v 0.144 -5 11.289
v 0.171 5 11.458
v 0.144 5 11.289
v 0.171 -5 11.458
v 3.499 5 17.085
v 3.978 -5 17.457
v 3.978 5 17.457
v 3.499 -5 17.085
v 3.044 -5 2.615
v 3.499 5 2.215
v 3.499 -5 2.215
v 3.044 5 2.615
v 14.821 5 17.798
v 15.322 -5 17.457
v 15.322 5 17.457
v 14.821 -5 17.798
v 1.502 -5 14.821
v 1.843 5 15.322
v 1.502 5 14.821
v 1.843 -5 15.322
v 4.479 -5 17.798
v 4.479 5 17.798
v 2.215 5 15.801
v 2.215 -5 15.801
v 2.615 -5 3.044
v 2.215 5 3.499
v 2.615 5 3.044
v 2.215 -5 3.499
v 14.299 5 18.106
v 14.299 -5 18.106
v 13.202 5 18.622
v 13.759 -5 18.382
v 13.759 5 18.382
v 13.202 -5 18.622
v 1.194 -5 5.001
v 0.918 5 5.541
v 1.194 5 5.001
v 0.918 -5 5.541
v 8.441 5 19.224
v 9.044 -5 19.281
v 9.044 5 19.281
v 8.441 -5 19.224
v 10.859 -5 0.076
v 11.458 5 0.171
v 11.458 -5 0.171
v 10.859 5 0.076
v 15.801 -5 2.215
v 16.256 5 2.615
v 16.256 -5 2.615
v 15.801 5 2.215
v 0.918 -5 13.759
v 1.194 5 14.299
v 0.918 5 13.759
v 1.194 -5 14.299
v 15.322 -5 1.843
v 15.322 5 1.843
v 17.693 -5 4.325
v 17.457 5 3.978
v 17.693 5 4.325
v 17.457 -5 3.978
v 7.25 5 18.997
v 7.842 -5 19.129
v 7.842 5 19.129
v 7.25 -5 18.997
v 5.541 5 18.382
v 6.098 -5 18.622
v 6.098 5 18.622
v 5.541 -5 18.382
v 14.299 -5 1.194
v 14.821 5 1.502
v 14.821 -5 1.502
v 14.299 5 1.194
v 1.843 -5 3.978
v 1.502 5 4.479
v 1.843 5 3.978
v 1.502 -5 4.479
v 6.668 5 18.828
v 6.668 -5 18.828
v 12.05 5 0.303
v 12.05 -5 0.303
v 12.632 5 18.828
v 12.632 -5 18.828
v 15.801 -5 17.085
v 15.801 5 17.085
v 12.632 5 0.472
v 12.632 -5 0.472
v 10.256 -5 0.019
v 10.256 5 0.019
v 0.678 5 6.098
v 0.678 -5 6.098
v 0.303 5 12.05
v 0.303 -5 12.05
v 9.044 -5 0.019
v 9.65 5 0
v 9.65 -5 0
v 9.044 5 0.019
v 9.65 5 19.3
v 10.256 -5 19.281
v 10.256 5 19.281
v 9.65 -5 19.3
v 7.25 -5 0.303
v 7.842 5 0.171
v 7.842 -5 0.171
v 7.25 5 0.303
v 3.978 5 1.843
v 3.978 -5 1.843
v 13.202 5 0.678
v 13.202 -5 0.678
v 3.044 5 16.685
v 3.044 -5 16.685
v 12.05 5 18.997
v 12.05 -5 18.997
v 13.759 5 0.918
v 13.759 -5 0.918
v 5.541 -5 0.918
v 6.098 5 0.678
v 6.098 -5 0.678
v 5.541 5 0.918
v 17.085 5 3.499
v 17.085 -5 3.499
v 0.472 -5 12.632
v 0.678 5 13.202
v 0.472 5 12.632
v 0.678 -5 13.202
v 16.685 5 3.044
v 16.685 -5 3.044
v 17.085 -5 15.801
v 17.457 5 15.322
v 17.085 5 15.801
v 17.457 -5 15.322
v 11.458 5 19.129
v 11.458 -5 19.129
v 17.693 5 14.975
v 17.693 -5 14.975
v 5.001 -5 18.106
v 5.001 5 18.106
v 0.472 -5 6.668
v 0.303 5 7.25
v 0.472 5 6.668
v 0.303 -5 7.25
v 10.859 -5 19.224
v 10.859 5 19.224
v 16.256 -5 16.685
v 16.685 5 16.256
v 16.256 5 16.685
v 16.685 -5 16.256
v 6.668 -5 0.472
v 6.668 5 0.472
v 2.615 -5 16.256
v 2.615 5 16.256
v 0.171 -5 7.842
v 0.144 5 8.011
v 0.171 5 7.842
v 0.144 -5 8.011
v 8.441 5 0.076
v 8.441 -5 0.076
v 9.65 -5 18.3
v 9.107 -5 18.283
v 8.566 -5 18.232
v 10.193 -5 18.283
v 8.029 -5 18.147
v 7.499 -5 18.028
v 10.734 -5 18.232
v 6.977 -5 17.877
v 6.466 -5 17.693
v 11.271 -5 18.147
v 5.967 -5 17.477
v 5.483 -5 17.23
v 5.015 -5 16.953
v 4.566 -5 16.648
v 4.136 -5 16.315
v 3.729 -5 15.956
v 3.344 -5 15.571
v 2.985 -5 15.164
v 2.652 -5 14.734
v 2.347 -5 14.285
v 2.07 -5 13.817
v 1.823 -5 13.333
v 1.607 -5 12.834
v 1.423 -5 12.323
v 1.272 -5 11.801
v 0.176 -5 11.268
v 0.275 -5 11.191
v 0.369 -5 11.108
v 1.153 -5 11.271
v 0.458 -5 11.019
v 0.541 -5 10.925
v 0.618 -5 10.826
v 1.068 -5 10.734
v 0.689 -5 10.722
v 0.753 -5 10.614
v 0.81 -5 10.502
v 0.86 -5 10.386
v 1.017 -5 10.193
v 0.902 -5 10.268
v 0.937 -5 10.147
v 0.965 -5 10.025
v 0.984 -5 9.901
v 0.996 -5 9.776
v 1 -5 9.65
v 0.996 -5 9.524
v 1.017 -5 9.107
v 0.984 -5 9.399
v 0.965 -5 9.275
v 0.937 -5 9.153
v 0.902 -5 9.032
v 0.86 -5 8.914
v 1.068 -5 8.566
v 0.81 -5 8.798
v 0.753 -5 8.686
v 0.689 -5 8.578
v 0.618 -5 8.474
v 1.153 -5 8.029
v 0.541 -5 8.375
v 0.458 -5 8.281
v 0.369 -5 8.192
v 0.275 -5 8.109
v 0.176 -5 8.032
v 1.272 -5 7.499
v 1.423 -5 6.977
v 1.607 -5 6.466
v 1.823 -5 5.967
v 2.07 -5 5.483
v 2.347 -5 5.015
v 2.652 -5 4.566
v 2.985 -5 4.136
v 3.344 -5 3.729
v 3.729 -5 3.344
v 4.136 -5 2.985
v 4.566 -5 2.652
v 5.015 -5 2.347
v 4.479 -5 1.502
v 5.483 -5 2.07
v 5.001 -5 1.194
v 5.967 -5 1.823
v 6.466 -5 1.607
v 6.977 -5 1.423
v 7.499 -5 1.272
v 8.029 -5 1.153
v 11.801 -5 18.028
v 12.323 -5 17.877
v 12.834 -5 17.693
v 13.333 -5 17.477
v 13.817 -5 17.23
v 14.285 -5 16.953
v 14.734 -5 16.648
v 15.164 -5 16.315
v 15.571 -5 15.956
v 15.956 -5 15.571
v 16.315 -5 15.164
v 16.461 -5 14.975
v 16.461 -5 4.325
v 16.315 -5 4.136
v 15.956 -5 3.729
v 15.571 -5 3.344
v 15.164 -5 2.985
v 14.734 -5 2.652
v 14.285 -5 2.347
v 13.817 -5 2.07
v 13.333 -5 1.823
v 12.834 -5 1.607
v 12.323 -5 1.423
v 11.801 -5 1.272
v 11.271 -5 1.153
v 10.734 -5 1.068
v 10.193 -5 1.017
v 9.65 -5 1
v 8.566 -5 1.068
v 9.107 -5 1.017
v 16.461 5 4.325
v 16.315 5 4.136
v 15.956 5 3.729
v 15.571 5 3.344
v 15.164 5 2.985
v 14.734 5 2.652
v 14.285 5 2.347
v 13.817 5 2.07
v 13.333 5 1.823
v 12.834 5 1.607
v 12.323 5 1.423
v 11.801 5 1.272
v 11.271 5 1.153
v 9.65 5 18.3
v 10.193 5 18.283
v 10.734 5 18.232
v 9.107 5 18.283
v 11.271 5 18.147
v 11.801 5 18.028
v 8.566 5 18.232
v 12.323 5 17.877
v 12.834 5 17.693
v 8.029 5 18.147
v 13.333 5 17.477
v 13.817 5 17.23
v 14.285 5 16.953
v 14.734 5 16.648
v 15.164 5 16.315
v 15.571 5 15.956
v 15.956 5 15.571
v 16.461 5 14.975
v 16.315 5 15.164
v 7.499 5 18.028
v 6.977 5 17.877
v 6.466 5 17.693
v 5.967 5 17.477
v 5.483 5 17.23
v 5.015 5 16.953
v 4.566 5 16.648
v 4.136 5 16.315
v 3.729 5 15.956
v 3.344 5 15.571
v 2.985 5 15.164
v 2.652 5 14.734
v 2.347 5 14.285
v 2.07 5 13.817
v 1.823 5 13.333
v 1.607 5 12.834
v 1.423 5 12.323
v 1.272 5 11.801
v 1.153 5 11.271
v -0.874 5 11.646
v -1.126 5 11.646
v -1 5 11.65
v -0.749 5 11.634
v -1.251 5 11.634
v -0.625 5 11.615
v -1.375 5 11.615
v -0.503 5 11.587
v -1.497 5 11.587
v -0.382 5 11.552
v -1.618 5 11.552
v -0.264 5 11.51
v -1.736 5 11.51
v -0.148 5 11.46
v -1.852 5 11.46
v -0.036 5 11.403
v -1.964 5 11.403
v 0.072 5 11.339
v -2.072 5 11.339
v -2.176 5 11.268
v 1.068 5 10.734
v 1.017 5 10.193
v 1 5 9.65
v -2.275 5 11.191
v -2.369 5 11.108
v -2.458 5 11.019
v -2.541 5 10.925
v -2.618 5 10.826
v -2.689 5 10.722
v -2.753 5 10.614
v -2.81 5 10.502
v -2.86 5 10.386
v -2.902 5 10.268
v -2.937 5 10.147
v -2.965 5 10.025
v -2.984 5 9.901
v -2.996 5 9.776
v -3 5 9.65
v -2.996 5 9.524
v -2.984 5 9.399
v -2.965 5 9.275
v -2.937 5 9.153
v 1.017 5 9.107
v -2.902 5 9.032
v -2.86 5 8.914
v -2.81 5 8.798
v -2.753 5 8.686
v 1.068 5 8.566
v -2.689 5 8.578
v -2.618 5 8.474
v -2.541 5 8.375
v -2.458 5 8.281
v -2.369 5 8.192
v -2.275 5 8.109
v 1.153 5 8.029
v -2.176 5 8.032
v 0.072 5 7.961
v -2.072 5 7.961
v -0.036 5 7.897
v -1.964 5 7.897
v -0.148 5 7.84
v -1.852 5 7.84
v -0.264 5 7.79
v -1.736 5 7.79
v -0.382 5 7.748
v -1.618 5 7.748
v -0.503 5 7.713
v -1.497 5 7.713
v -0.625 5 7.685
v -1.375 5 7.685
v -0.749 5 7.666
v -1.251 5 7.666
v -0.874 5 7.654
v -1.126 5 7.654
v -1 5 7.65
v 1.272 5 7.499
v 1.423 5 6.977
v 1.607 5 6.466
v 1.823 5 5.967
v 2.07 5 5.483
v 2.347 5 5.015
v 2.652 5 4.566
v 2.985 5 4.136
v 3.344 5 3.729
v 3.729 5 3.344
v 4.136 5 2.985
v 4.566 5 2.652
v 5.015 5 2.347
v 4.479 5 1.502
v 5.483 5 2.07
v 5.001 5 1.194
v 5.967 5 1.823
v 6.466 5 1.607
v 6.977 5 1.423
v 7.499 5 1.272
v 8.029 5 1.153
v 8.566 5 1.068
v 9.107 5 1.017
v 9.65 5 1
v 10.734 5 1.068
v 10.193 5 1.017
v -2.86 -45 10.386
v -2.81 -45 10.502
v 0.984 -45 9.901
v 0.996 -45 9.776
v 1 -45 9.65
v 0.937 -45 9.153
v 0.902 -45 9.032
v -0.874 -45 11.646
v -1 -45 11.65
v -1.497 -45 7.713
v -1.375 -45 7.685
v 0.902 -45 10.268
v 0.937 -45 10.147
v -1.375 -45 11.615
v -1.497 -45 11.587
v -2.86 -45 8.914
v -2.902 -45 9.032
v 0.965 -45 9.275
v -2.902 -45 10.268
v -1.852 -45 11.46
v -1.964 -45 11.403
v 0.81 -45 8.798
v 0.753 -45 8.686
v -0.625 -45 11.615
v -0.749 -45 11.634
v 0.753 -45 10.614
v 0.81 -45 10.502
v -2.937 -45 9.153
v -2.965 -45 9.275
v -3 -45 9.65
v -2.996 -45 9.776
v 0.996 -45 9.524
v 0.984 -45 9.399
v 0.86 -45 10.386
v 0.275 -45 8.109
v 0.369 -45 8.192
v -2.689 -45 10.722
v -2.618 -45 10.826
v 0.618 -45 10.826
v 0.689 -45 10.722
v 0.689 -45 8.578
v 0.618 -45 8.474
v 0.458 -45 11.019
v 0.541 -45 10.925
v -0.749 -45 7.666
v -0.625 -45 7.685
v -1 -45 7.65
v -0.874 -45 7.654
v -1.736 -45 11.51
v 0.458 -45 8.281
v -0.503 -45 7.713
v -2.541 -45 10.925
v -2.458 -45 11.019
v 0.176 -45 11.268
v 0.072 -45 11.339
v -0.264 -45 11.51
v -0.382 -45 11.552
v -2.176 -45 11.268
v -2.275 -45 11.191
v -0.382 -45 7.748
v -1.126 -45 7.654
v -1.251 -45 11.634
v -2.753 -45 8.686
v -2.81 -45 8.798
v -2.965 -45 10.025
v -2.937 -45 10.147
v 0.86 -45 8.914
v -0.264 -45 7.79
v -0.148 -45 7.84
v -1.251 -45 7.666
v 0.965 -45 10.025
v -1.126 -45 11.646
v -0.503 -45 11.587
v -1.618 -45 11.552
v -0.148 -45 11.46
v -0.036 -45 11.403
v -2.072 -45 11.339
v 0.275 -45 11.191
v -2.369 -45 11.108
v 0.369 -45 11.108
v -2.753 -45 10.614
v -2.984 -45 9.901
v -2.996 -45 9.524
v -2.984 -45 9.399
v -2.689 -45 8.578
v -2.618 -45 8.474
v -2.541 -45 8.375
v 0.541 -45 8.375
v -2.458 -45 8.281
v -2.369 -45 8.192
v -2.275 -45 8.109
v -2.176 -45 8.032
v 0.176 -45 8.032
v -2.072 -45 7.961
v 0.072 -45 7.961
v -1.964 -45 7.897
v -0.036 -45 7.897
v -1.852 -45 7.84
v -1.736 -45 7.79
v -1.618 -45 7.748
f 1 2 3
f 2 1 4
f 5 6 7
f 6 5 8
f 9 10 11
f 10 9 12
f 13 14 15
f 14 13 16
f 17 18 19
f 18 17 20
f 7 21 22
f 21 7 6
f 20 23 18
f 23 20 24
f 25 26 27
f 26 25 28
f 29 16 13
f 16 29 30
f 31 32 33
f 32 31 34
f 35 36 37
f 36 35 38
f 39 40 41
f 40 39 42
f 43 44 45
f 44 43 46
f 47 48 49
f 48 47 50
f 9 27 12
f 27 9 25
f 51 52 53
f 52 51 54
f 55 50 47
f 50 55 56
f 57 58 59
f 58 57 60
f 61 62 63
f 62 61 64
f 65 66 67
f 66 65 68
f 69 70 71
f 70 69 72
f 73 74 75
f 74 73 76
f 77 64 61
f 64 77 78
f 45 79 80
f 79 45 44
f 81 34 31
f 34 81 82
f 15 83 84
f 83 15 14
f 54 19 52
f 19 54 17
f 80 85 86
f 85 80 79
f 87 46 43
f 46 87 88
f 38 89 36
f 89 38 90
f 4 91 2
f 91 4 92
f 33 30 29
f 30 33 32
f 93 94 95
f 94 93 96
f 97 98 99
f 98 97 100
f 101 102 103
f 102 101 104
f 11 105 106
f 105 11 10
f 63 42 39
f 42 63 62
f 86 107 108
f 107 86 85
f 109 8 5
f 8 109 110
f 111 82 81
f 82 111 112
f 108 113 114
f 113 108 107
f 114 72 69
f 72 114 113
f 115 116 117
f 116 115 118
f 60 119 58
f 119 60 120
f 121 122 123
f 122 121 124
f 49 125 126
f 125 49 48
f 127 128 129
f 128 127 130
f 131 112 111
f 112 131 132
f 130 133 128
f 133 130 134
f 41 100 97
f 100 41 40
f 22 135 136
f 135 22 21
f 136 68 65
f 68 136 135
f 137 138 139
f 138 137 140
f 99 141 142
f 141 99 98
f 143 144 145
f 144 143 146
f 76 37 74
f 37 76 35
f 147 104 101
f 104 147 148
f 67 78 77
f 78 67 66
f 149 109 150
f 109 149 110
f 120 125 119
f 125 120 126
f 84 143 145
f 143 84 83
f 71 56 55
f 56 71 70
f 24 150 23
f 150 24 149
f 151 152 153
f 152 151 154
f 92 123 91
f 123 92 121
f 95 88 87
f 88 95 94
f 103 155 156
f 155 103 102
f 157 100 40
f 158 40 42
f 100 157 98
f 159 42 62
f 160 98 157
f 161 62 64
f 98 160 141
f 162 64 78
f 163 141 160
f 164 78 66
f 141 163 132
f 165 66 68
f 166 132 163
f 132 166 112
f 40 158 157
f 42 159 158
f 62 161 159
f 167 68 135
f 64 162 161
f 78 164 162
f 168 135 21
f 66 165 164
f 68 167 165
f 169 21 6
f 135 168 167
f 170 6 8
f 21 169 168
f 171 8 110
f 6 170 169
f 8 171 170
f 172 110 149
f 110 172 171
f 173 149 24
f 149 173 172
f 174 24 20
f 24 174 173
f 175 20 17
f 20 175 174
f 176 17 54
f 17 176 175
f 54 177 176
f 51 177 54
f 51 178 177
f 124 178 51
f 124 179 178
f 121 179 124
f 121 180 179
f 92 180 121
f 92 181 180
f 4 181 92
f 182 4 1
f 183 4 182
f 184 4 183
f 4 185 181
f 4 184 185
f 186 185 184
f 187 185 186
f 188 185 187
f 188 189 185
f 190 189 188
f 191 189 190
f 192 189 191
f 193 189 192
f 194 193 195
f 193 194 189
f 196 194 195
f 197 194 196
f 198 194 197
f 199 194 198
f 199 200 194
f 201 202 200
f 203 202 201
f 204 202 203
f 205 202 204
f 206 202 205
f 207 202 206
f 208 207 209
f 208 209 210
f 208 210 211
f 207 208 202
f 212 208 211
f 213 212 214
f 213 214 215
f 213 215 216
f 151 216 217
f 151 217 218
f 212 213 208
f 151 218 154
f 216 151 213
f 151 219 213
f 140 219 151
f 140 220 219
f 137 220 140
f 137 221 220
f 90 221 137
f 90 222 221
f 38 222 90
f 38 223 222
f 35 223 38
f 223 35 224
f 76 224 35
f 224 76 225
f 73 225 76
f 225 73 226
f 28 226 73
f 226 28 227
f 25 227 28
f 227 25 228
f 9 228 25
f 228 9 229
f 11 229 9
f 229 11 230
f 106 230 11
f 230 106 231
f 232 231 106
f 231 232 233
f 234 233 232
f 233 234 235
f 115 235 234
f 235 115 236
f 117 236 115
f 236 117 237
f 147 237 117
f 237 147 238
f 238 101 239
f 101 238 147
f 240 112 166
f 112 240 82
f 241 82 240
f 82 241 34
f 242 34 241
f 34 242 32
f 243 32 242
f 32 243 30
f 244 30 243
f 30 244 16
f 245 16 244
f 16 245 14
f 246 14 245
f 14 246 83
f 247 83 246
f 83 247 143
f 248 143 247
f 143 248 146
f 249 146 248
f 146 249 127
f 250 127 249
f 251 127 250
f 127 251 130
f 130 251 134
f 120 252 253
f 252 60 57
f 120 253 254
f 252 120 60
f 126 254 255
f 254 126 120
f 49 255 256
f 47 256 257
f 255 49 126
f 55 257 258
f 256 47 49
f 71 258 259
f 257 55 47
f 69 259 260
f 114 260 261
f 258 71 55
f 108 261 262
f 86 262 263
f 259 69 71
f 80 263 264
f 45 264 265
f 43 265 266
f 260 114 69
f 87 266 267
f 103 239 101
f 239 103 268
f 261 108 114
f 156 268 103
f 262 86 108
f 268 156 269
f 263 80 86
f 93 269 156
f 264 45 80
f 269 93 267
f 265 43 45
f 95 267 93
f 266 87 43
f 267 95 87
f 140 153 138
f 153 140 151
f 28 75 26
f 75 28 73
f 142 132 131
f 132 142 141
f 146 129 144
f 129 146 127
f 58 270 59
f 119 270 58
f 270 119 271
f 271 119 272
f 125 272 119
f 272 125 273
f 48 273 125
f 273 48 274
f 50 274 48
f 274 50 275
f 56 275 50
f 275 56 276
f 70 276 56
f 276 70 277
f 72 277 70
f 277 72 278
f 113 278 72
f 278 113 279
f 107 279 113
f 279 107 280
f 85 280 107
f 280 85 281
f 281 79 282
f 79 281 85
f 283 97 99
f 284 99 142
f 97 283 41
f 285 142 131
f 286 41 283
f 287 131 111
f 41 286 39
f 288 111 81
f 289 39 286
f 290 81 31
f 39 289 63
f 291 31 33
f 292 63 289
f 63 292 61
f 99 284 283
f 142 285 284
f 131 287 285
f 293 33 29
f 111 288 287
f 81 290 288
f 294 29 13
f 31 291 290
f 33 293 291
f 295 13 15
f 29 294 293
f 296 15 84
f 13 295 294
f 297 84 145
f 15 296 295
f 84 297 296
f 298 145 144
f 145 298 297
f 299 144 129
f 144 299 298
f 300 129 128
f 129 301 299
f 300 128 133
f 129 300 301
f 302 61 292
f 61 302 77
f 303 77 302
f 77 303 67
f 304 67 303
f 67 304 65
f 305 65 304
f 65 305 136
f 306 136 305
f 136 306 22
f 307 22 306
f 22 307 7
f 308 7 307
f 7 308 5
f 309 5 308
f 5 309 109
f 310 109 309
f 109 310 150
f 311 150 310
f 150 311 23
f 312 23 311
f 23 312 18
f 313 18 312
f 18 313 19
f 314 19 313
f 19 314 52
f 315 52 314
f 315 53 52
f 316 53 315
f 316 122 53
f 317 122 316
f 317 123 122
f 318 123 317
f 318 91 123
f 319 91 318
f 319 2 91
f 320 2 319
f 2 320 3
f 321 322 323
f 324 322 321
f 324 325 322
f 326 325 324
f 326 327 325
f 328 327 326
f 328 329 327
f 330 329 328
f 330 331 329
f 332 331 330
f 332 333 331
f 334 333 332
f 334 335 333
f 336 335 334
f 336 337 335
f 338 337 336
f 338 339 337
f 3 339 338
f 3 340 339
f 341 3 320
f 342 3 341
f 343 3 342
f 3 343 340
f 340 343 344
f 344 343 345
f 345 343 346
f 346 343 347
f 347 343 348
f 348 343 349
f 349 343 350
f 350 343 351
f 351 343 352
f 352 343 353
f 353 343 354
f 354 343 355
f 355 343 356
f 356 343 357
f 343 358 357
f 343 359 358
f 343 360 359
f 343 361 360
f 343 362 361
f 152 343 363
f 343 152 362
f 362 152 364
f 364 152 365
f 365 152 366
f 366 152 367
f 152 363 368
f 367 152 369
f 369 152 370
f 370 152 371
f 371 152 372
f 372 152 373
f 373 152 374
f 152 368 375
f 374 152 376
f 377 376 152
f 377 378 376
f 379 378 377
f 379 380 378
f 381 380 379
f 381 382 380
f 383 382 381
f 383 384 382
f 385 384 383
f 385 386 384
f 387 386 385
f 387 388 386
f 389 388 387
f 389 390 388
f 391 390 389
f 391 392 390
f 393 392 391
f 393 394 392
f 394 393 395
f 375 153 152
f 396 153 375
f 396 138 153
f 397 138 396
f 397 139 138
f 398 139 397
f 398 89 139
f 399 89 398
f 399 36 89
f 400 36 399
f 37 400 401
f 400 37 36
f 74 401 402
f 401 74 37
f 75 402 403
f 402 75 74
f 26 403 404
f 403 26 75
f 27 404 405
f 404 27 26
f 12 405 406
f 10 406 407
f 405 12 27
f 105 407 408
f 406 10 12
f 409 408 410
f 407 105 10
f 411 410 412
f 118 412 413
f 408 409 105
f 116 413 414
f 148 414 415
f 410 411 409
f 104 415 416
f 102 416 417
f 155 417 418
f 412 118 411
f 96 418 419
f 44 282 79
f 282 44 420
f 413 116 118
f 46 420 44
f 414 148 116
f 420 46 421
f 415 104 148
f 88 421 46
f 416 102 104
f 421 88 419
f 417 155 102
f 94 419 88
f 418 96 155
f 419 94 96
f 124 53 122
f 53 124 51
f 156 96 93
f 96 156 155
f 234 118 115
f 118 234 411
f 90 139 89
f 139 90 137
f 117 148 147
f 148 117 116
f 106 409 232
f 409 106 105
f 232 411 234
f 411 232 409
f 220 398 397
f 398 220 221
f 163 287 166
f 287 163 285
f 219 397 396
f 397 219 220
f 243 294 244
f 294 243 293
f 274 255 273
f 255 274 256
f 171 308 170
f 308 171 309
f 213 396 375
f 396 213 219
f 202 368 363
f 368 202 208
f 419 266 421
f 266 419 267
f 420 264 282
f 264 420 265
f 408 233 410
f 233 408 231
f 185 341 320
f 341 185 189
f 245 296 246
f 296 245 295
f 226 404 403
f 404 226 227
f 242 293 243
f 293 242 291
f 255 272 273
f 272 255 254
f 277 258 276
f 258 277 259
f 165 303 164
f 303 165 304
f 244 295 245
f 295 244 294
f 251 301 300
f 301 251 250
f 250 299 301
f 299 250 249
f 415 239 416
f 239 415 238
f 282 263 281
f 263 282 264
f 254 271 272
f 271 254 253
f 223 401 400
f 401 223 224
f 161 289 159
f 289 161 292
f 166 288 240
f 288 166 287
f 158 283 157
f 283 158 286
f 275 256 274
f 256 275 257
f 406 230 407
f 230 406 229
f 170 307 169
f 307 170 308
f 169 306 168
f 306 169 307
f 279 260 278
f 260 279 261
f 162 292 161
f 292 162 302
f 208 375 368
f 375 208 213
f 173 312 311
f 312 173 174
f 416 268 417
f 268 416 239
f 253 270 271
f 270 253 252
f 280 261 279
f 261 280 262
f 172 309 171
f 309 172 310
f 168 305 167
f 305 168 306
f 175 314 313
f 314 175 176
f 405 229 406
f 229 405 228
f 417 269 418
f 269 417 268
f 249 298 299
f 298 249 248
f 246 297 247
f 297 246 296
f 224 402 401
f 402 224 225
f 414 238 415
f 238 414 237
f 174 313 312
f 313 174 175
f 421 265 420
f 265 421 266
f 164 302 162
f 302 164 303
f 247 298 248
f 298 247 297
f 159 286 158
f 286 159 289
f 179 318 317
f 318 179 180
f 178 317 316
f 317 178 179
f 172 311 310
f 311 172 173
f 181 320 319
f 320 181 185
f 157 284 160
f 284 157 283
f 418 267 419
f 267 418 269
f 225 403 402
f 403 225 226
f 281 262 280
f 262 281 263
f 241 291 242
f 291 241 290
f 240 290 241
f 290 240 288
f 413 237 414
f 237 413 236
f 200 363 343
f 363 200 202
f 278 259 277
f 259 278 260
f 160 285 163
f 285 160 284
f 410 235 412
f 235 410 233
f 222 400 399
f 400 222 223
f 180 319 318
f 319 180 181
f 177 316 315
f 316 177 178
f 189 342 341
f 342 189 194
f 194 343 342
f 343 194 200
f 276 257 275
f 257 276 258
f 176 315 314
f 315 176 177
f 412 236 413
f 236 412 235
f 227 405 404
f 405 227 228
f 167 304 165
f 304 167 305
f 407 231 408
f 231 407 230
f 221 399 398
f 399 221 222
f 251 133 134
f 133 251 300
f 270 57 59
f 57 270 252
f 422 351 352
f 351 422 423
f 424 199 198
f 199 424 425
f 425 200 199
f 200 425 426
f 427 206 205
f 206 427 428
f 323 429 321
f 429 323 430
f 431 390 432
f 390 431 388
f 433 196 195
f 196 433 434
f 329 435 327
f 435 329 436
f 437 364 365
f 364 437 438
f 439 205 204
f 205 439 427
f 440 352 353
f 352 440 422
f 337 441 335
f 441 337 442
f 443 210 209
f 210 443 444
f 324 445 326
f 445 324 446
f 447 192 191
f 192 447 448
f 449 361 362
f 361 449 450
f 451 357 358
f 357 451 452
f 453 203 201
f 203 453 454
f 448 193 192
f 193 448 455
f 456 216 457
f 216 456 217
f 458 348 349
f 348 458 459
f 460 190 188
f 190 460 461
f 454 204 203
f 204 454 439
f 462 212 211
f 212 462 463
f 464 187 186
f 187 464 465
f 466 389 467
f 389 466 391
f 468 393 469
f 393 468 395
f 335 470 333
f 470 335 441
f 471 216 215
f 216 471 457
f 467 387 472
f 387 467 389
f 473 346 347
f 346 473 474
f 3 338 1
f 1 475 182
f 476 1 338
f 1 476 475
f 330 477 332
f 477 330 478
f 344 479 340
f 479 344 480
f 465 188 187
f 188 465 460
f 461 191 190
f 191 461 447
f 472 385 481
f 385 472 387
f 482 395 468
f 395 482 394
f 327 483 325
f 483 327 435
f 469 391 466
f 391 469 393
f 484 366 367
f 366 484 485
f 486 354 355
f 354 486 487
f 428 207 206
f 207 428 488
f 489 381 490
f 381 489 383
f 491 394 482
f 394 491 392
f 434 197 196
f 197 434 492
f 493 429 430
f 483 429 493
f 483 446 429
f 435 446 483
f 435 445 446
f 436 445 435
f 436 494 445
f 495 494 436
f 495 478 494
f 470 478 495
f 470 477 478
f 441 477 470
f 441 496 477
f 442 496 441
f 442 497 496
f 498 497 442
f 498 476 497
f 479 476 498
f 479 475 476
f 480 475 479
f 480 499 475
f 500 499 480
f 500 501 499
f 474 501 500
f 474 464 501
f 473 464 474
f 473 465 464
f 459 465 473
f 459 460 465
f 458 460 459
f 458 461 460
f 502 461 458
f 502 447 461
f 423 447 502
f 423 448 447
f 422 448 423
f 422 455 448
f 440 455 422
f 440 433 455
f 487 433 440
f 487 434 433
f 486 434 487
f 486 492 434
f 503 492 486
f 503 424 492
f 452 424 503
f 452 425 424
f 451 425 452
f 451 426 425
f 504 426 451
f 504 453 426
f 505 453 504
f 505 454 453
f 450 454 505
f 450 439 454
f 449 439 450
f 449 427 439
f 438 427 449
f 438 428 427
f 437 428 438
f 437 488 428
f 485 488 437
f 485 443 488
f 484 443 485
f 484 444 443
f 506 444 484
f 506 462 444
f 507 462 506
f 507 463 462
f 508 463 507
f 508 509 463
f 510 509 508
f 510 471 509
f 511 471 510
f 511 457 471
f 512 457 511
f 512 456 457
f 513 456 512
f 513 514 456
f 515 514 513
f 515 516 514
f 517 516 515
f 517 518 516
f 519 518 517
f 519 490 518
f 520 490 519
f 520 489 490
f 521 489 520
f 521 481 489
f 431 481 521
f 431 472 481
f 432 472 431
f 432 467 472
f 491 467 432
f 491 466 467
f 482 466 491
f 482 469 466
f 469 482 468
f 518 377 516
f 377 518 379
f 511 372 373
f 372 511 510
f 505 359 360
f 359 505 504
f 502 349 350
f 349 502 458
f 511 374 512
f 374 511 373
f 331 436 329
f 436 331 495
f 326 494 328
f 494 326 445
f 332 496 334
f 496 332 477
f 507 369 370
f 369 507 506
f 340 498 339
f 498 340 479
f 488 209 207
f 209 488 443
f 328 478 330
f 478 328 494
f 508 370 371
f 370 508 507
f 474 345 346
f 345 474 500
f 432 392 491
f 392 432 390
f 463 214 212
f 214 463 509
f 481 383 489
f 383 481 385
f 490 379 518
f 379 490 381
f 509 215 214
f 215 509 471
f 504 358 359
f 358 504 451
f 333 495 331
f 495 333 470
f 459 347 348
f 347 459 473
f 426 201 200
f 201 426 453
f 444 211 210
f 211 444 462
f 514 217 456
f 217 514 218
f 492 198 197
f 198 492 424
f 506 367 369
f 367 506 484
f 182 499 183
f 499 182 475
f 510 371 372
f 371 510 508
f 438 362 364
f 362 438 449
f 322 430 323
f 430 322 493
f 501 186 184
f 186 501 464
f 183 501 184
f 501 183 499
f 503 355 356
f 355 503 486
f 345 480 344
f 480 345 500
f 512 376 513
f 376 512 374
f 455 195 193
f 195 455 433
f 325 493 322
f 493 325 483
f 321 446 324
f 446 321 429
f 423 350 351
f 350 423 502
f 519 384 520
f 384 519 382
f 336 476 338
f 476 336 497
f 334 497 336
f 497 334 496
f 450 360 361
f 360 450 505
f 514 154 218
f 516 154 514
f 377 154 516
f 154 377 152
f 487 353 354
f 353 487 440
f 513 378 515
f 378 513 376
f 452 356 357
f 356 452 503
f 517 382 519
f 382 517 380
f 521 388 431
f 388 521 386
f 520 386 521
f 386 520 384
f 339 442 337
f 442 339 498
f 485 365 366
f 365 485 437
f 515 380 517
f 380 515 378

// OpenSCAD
$fn=100;

handle_base_radius = 19.3/2;
handle_depth = 5.5;
handle_depth = 10;

translate([handle_base_radius, 0, handle_base_radius]) {
  rotate([90, 0, 0]) {
    difference() {
      cylinder(handle_depth, handle_base_radius, handle_base_radius, center = true);
      cylinder(handle_depth, handle_base_radius - 1, handle_base_radius - 1, center = true);
      rotate([0, 90, 0]) {
        translate([0, 0, handle_base_radius]) {
         cube([handle_depth, handle_base_radius + 1, handle_base_radius], center = true);
        }
      }
    }
  }
}

translate([-1, -20, handle_base_radius]) {
  rotate([90, 0, 0]) {
    cylinder(50, 2, 2, center = true);
  }
}
